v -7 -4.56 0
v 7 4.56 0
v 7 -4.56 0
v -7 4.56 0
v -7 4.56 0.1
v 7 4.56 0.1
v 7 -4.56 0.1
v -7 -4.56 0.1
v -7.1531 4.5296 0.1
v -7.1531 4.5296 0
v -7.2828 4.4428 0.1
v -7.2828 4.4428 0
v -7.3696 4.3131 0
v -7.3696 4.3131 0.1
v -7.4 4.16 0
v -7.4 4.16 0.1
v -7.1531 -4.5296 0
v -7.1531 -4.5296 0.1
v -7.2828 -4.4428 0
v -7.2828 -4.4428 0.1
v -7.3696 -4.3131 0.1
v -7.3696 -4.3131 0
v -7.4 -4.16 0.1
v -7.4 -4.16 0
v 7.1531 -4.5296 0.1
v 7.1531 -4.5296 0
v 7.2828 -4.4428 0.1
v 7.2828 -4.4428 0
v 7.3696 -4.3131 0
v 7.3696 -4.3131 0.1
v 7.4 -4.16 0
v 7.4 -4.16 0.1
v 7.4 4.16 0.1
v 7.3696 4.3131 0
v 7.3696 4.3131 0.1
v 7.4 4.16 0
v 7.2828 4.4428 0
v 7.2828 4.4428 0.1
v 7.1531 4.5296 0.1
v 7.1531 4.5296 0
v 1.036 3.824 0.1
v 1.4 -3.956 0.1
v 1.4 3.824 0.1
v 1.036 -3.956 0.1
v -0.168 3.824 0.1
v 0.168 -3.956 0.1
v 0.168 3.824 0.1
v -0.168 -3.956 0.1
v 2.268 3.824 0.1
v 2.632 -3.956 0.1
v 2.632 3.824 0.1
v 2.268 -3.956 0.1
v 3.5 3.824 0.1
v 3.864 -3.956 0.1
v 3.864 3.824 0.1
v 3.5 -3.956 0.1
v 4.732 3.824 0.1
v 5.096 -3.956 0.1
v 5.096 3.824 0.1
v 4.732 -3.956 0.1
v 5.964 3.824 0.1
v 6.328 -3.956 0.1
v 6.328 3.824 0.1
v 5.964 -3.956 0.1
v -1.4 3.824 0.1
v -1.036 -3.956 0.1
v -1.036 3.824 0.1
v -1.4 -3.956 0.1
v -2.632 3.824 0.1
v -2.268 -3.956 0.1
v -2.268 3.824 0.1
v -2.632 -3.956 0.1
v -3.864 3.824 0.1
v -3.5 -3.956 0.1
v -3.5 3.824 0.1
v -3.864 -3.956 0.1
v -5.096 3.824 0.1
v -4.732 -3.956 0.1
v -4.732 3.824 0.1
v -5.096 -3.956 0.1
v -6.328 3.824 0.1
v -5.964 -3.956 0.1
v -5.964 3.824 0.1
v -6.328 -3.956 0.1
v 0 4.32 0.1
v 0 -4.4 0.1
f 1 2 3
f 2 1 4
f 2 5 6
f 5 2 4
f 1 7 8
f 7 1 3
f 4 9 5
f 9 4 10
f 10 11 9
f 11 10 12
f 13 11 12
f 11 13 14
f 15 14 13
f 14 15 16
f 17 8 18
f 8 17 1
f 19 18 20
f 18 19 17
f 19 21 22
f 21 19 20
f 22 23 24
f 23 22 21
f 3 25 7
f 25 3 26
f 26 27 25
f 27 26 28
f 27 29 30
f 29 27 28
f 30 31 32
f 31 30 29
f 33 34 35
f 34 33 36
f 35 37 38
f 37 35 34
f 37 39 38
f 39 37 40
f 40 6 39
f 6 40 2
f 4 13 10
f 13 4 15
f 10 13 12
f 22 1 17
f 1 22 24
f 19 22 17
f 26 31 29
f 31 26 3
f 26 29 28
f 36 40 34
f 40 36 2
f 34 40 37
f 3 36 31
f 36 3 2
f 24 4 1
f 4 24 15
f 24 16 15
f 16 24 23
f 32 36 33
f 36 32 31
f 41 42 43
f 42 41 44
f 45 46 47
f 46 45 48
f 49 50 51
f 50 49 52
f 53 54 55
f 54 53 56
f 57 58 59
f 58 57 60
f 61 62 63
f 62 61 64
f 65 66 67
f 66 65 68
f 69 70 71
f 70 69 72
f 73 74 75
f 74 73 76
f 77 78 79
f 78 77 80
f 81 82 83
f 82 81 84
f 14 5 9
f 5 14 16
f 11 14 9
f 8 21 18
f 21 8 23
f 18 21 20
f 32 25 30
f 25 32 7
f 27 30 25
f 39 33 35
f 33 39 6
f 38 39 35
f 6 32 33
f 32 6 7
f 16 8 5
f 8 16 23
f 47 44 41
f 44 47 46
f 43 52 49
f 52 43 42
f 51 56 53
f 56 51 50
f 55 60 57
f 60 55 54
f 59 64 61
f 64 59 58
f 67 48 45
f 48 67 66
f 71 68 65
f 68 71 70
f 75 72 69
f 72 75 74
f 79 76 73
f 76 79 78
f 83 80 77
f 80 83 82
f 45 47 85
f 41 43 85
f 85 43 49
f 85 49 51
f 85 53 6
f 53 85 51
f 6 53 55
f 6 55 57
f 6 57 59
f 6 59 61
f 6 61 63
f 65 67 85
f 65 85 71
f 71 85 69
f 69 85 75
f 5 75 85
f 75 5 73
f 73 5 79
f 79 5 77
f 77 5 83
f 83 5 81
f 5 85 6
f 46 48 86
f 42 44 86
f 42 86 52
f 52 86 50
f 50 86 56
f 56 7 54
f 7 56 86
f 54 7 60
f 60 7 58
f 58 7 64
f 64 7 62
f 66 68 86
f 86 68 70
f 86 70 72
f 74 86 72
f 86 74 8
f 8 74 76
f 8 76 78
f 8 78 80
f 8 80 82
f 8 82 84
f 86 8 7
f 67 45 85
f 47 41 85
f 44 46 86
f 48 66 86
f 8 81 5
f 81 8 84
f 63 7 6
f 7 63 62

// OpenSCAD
// file: ../p/box3u12.scad
use <../lib.scad>
function ldraw_lib__box3u12() = [
// 0 Box with 3 Parallel Faces without Any Edges
// 0 Name: box3u12.dat
// 0 Author: J.C. Tchang [tchang]
// 0 !LDRAW_ORG Primitive UPDATE 2014-02
// 0 !LICENSE Licensed under CC BY 2.0 and CC BY 4.0 : see CAreadme.txt
// 
// 0 BFC CERTIFY CCW
  [0,"BFC","CERTIFY"],
  [0,"BFC","CCW"],
// 
// 0 !HISTORY 2014-12-23 [PTadmin] Official Update 2014-02
// 
// 
// 4 16 -1 1 1 1 1 1 1 1 -1 -1 1 -1
  [4,16,-1,1,1,1,1,1,1,1,-1,-1,1,-1],
// 4 16 -1 1 1 -1 0 1 1 0 1 1 1 1
  [4,16,-1,1,1,-1,0,1,1,0,1,1,1,1],
// 4 16 1 1 -1 1 0 -1 -1 0 -1 -1 1 -1
  [4,16,1,1,-1,1,0,-1,-1,0,-1,-1,1,-1],
];
makepoly(ldraw_lib__box3u12(), line=0.2);
// file: ../p/1-4cyli.scad
use <../lib.scad>
function ldraw_lib__1_4cyli() = [
// 0 Cylinder 0.25
// 0 Name: 1-4cyli.dat
// 0 Author: James Jessiman
// 0 !LDRAW_ORG Primitive UPDATE 2012-01
// 0 !LICENSE Licensed under CC BY 2.0 and CC BY 4.0 : see CAreadme.txt
// 
// 0 BFC CERTIFY CCW
  [0,"BFC","CERTIFY"],
  [0,"BFC","CCW"],
// 
// 0 !HISTORY 2002-03-23 [sbliss] Added BFC statement.
// 0 !HISTORY 2002-04-25 [PTadmin] Official Update 2002-02
// 0 !HISTORY 2007-06-22 [PTadmin] Header formatted for Contributor Agreement
// 0 !HISTORY 2008-07-01 [PTadmin] Official Update 2008-01
// 0 !HISTORY 2012-02-16 [Philo] Changed to CCW
// 0 !HISTORY 2012-03-30 [PTadmin] Official Update 2012-01
// 
// 
// 4 16 1 1 0 0.9239 1 0.3827 0.9239 0 0.3827 1 0 0
  [4,16,1,1,0,0.9239,1,0.3827,0.9239,0,0.3827,1,0,0],
// 5 24 1 0 0 1 1 0 0.9239 0 0.3827 1 0 -1
  [5,24,1,0,0,1,1,0,0.9239,0,0.3827,1,0,-1],
// 4 16 0.9239 1 0.3827 0.7071 1 0.7071 0.7071 0 0.7071 0.9239 0 0.3827
  [4,16,0.9239,1,0.3827,0.7071,1,0.7071,0.7071,0,0.7071,0.9239,0,0.3827],
// 5 24 0.9239 0 0.3827 0.9239 1 0.3827 0.7071 0 0.7071 1 0 0
  [5,24,0.9239,0,0.3827,0.9239,1,0.3827,0.7071,0,0.7071,1,0,0],
// 4 16 0.7071 1 0.7071 0.3827 1 0.9239 0.3827 0 0.9239 0.7071 0 0.7071
  [4,16,0.7071,1,0.7071,0.3827,1,0.9239,0.3827,0,0.9239,0.7071,0,0.7071],
// 5 24 0.7071 0 0.7071 0.7071 1 0.7071 0.3827 0 0.9239 0.9239 0 0.3827
  [5,24,0.7071,0,0.7071,0.7071,1,0.7071,0.3827,0,0.9239,0.9239,0,0.3827],
// 4 16 0.3827 1 0.9239 0 1 1 0 0 1 0.3827 0 0.9239
  [4,16,0.3827,1,0.9239,0,1,1,0,0,1,0.3827,0,0.9239],
// 5 24 0.3827 0 0.9239 0.3827 1 0.9239 0 0 1 0.7071 0 0.7071
  [5,24,0.3827,0,0.9239,0.3827,1,0.9239,0,0,1,0.7071,0,0.7071],
// 5 24 0 0 1 0 1 1 0.3827 0 0.9239 -1 0 1
  [5,24,0,0,1,0,1,1,0.3827,0,0.9239,-1,0,1],
];
makepoly(ldraw_lib__1_4cyli(), line=0.2);
// file: ../p/1-4chrd.scad
use <../lib.scad>
function ldraw_lib__1_4chrd() = [
// 0 Chord 0.25
// 0 Name: 1-4chrd.dat
// 0 Author: Tony Hafner [hafhead]
// 0 !LDRAW_ORG Primitive UPDATE 2012-02
// 0 !LICENSE Licensed under CC BY 2.0 and CC BY 4.0 : see CAreadme.txt
// 
// 0 BFC CERTIFY CCW
  [0,"BFC","CERTIFY"],
  [0,"BFC","CCW"],
// 
// 0 !HISTORY 2004-04-22 [PTadmin] Official Update 2004-02
// 0 !HISTORY 2007-10-09 [PTadmin] Header formatted for Contributor Agreement
// 0 !HISTORY 2008-07-01 [PTadmin] Official Update 2008-01
// 0 !HISTORY 2012-08-02 [MMR1988] Re-creation with PrimGen2 and Rectifier
// 0 !HISTORY 2012-08-09 [PTadmin] Official Update 2012-02
// 
// 
// 4 16 0.9239 0 0.3827 0.3827 0 0.9239 0 0 1 1 0 0
  [4,16,0.9239,0,0.3827,0.3827,0,0.9239,0,0,1,1,0,0],
// 3 16 0.7071 0 0.7071 0.3827 0 0.9239 0.9239 0 0.3827
  [3,16,0.7071,0,0.7071,0.3827,0,0.9239,0.9239,0,0.3827],
];
makepoly(ldraw_lib__1_4chrd(), line=0.2);
// main file
use <../lib.scad>
use <../p/1-4chrd.scad>
use <../p/1-4cyli.scad>
use <../p/box3u12.scad>
function ldraw_lib__4121723k() = [
// 0 Sticker  1.1 x  1.9 with 11 Simulated Ventilation Slots on Transparent Background
// 0 Name: 4121723k.dat
// 0 Author: Ulrich Röder [UR]
// 0 !LDRAW_ORG Part UPDATE 2022-06
// 0 !LICENSE Licensed under CC BY 2.0 and CC BY 4.0 : see CAreadme.txt
// 
// 0 BFC CERTIFY CCW
  [0,"BFC","CERTIFY"],
  [0,"BFC","CCW"],
// 
// 0 !KEYWORDS Model Team, Racing Truck, Set 5563
// 
// 0 !HISTORY 2022-12-20 [PTadmin] Official Update 2022-06
// 
// 
// 0 // Body
// 
// 1 16 0 -0.25 0 17.5 0 0 0 0.25 0 0 0 11.4 box3u12.dat
  [1,16,0,-0.25,0,17.5,0,0,0,0.25,0,0,0,11.4, ldraw_lib__box3u12()],
// 1 16 -17.5 0 10.4 0 0 -1 0 -.25 0 1 0 0 1-4cyli.dat
  [1,16,-17.5,0,10.4,0,0,-1,0,-.25,0,1,0,0, ldraw_lib__1_4cyli()],
// 1 16 -17.5 0 -10.4 0 0 -1 0 -.25 0 -1 0 0 1-4cyli.dat
  [1,16,-17.5,0,-10.4,0,0,-1,0,-.25,0,-1,0,0, ldraw_lib__1_4cyli()],
// 1 16 17.5 0 -10.4 0 0 1 0 -.25 0 -1 0 0 1-4cyli.dat
  [1,16,17.5,0,-10.4,0,0,1,0,-.25,0,-1,0,0, ldraw_lib__1_4cyli()],
// 1 16 17.5 0 10.4 1 0 0 0 -.25 0 0 0 1 1-4cyli.dat
  [1,16,17.5,0,10.4,1,0,0,0,-.25,0,0,0,1, ldraw_lib__1_4cyli()],
// 1 16 -17.5 0 10.4 0 0 -1 0 -1 0 1 0 0 1-4chrd.dat
  [1,16,-17.5,0,10.4,0,0,-1,0,-1,0,1,0,0, ldraw_lib__1_4chrd()],
// 1 16 -17.5 0 -10.4 0 0 -1 0 -1 0 -1 0 0 1-4chrd.dat
  [1,16,-17.5,0,-10.4,0,0,-1,0,-1,0,-1,0,0, ldraw_lib__1_4chrd()],
// 1 16 17.5 0 -10.4 0 0 1 0 -1 0 -1 0 0 1-4chrd.dat
  [1,16,17.5,0,-10.4,0,0,1,0,-1,0,-1,0,0, ldraw_lib__1_4chrd()],
// 1 16 17.5 0 10.4 1 0 0 0 -1 0 0 0 1 1-4chrd.dat
  [1,16,17.5,0,10.4,1,0,0,0,-1,0,0,0,1, ldraw_lib__1_4chrd()],
// 4 16 17.5 0 11.4 18.5 0 10.4 18.5 0 -10.4 17.5 0 -11.4
  [4,16,17.5,0,11.4,18.5,0,10.4,18.5,0,-10.4,17.5,0,-11.4],
// 4 16 -17.5 0 -11.4 -18.5 0 -10.4 -18.5 0 10.4 -17.5 0 11.4
  [4,16,-17.5,0,-11.4,-18.5,0,-10.4,-18.5,0,10.4,-17.5,0,11.4],
// 4 16 -18.5 -.25 10.4 -18.5 0 10.4 -18.5 0 -10.4 -18.5 -.25 -10.4
  [4,16,-18.5,-.25,10.4,-18.5,0,10.4,-18.5,0,-10.4,-18.5,-.25,-10.4],
// 4 16 18.5 0 -10.4 18.5 0 10.4 18.5 -.25 10.4 18.5 -.25 -10.4
  [4,16,18.5,0,-10.4,18.5,0,10.4,18.5,-.25,10.4,18.5,-.25,-10.4],
// 
// 0 // Frontface
// 0 BFC NOCLIP
  [0,"BFC","NOCLIP"],
// 4 0 2.59 -.25 9.56 2.59 -.25 -9.89 3.5 -.25 -9.89 3.5 -.25 9.56
  [4,0,2.59,-.25,9.56,2.59,-.25,-9.89,3.5,-.25,-9.89,3.5,-.25,9.56],
// 4 0 .42 -.25 -9.89 .42 -.25 9.56 -.42 -.25 9.56 -.42 -.25 -9.89
  [4,0,.42,-.25,-9.89,.42,-.25,9.56,-.42,-.25,9.56,-.42,-.25,-9.89],
// 4 0 5.67 -.25 9.56 5.67 -.25 -9.89 6.58 -.25 -9.89 6.58 -.25 9.56
  [4,0,5.67,-.25,9.56,5.67,-.25,-9.89,6.58,-.25,-9.89,6.58,-.25,9.56],
// 4 0 8.75 -.25 9.56 8.75 -.25 -9.89 9.66 -.25 -9.89 9.66 -.25 9.56
  [4,0,8.75,-.25,9.56,8.75,-.25,-9.89,9.66,-.25,-9.89,9.66,-.25,9.56],
// 4 0 11.83 -.25 9.56 11.83 -.25 -9.89 12.74 -.25 -9.89 12.74 -.25 9.56
  [4,0,11.83,-.25,9.56,11.83,-.25,-9.89,12.74,-.25,-9.89,12.74,-.25,9.56],
// 4 0 14.91 -.25 9.56 14.91 -.25 -9.89 15.82 -.25 -9.89 15.82 -.25 9.56
  [4,0,14.91,-.25,9.56,14.91,-.25,-9.89,15.82,-.25,-9.89,15.82,-.25,9.56],
// 4 0 -3.5 -.25 -9.89 -2.59 -.25 -9.89 -2.59 -.25 9.56 -3.5 -.25 9.56
  [4,0,-3.5,-.25,-9.89,-2.59,-.25,-9.89,-2.59,-.25,9.56,-3.5,-.25,9.56],
// 4 0 -6.58 -.25 -9.89 -5.67 -.25 -9.89 -5.67 -.25 9.56 -6.58 -.25 9.56
  [4,0,-6.58,-.25,-9.89,-5.67,-.25,-9.89,-5.67,-.25,9.56,-6.58,-.25,9.56],
// 4 0 -9.66 -.25 -9.89 -8.75 -.25 -9.89 -8.75 -.25 9.56 -9.66 -.25 9.56
  [4,0,-9.66,-.25,-9.89,-8.75,-.25,-9.89,-8.75,-.25,9.56,-9.66,-.25,9.56],
// 4 0 -12.74 -.25 -9.89 -11.83 -.25 -9.89 -11.83 -.25 9.56 -12.74 -.25 9.56
  [4,0,-12.74,-.25,-9.89,-11.83,-.25,-9.89,-11.83,-.25,9.56,-12.74,-.25,9.56],
// 4 0 -15.82 -.25 -9.89 -14.91 -.25 -9.89 -14.91 -.25 9.56 -15.82 -.25 9.56
  [4,0,-15.82,-.25,-9.89,-14.91,-.25,-9.89,-14.91,-.25,9.56,-15.82,-.25,9.56],
// 0 BFC CLIP
  [0,"BFC","CLIP"],
// 
// 1 16 -17.5 -.25 10.4 0 0 -1 0 1 0 1 0 0 1-4chrd.dat
  [1,16,-17.5,-.25,10.4,0,0,-1,0,1,0,1,0,0, ldraw_lib__1_4chrd()],
// 1 16 -17.5 -.25 -10.4 0 0 -1 0 1 0 -1 0 0 1-4chrd.dat
  [1,16,-17.5,-.25,-10.4,0,0,-1,0,1,0,-1,0,0, ldraw_lib__1_4chrd()],
// 1 16 17.5 -.25 -10.4 0 0 1 0 1 0 -1 0 0 1-4chrd.dat
  [1,16,17.5,-.25,-10.4,0,0,1,0,1,0,-1,0,0, ldraw_lib__1_4chrd()],
// 1 16 17.5 -.25 10.4 1 0 0 0 1 0 0 0 1 1-4chrd.dat
  [1,16,17.5,-.25,10.4,1,0,0,0,1,0,0,0,1, ldraw_lib__1_4chrd()],
// 4 16 18.5 -.25 -10.4 18.5 -.25 10.4 17.5 -.25 11.4 17.5 -.25 -11.4
  [4,16,18.5,-.25,-10.4,18.5,-.25,10.4,17.5,-.25,11.4,17.5,-.25,-11.4],
// 4 16 -18.5 -.25 10.4 -18.5 -.25 -10.4 -17.5 -.25 -11.4 -17.5 -.25 11.4
  [4,16,-18.5,-.25,10.4,-18.5,-.25,-10.4,-17.5,-.25,-11.4,-17.5,-.25,11.4],
// 4 16 2.59 -.25 -9.89 2.59 -.25 9.56 .42 -.25 9.56 .42 -.25 -9.89
  [4,16,2.59,-.25,-9.89,2.59,-.25,9.56,.42,-.25,9.56,.42,-.25,-9.89],
// 4 16 5.67 -.25 -9.89 5.67 -.25 9.56 3.5 -.25 9.56 3.5 -.25 -9.89
  [4,16,5.67,-.25,-9.89,5.67,-.25,9.56,3.5,-.25,9.56,3.5,-.25,-9.89],
// 4 16 8.75 -.25 -9.89 8.75 -.25 9.56 6.58 -.25 9.56 6.58 -.25 -9.89
  [4,16,8.75,-.25,-9.89,8.75,-.25,9.56,6.58,-.25,9.56,6.58,-.25,-9.89],
// 4 16 11.83 -.25 -9.89 11.83 -.25 9.56 9.66 -.25 9.56 9.66 -.25 -9.89
  [4,16,11.83,-.25,-9.89,11.83,-.25,9.56,9.66,-.25,9.56,9.66,-.25,-9.89],
// 4 16 14.91 -.25 -9.89 14.91 -.25 9.56 12.74 -.25 9.56 12.74 -.25 -9.89
  [4,16,14.91,-.25,-9.89,14.91,-.25,9.56,12.74,-.25,9.56,12.74,-.25,-9.89],
// 4 16 -.42 -.25 9.56 -2.59 -.25 9.56 -2.59 -.25 -9.89 -.42 -.25 -9.89
  [4,16,-.42,-.25,9.56,-2.59,-.25,9.56,-2.59,-.25,-9.89,-.42,-.25,-9.89],
// 4 16 -3.5 -.25 9.56 -5.67 -.25 9.56 -5.67 -.25 -9.89 -3.5 -.25 -9.89
  [4,16,-3.5,-.25,9.56,-5.67,-.25,9.56,-5.67,-.25,-9.89,-3.5,-.25,-9.89],
// 4 16 -6.58 -.25 9.56 -8.75 -.25 9.56 -8.75 -.25 -9.89 -6.58 -.25 -9.89
  [4,16,-6.58,-.25,9.56,-8.75,-.25,9.56,-8.75,-.25,-9.89,-6.58,-.25,-9.89],
// 4 16 -9.66 -.25 9.56 -11.83 -.25 9.56 -11.83 -.25 -9.89 -9.66 -.25 -9.89
  [4,16,-9.66,-.25,9.56,-11.83,-.25,9.56,-11.83,-.25,-9.89,-9.66,-.25,-9.89],
// 4 16 -12.74 -.25 9.56 -14.91 -.25 9.56 -14.91 -.25 -9.89 -12.74 -.25 -9.89
  [4,16,-12.74,-.25,9.56,-14.91,-.25,9.56,-14.91,-.25,-9.89,-12.74,-.25,-9.89],
// 3 16 -.42 -.25 9.56 .42 -.25 9.56 0 -.25 10.8
  [3,16,-.42,-.25,9.56,.42,-.25,9.56,0,-.25,10.8],
// 3 16 2.59 -.25 9.56 3.5 -.25 9.56 0 -.25 10.8
  [3,16,2.59,-.25,9.56,3.5,-.25,9.56,0,-.25,10.8],
// 3 16 0 -.25 10.8 3.5 -.25 9.56 5.67 -.25 9.56
  [3,16,0,-.25,10.8,3.5,-.25,9.56,5.67,-.25,9.56],
// 3 16 0 -.25 10.8 5.67 -.25 9.56 6.58 -.25 9.56
  [3,16,0,-.25,10.8,5.67,-.25,9.56,6.58,-.25,9.56],
// 4 16 17.5 -.25 11.4 0 -.25 10.8 6.58 -.25 9.56 8.75 -.25 9.56
  [4,16,17.5,-.25,11.4,0,-.25,10.8,6.58,-.25,9.56,8.75,-.25,9.56],
// 3 16 17.5 -.25 11.4 8.75 -.25 9.56 9.66 -.25 9.56
  [3,16,17.5,-.25,11.4,8.75,-.25,9.56,9.66,-.25,9.56],
// 3 16 17.5 -.25 11.4 9.66 -.25 9.56 11.83 -.25 9.56
  [3,16,17.5,-.25,11.4,9.66,-.25,9.56,11.83,-.25,9.56],
// 3 16 17.5 -.25 11.4 11.83 -.25 9.56 12.74 -.25 9.56
  [3,16,17.5,-.25,11.4,11.83,-.25,9.56,12.74,-.25,9.56],
// 3 16 17.5 -.25 11.4 12.74 -.25 9.56 14.91 -.25 9.56
  [3,16,17.5,-.25,11.4,12.74,-.25,9.56,14.91,-.25,9.56],
// 3 16 17.5 -.25 11.4 14.91 -.25 9.56 15.82 -.25 9.56
  [3,16,17.5,-.25,11.4,14.91,-.25,9.56,15.82,-.25,9.56],
// 3 16 -3.5 -.25 9.56 -2.59 -.25 9.56 0 -.25 10.8
  [3,16,-3.5,-.25,9.56,-2.59,-.25,9.56,0,-.25,10.8],
// 3 16 -3.5 -.25 9.56 0 -.25 10.8 -5.67 -.25 9.56
  [3,16,-3.5,-.25,9.56,0,-.25,10.8,-5.67,-.25,9.56],
// 3 16 -5.67 -.25 9.56 0 -.25 10.8 -6.58 -.25 9.56
  [3,16,-5.67,-.25,9.56,0,-.25,10.8,-6.58,-.25,9.56],
// 3 16 -6.58 -.25 9.56 0 -.25 10.8 -8.75 -.25 9.56
  [3,16,-6.58,-.25,9.56,0,-.25,10.8,-8.75,-.25,9.56],
// 4 16 0 -.25 10.8 -17.5 -.25 11.4 -9.66 -.25 9.56 -8.75 -.25 9.56
  [4,16,0,-.25,10.8,-17.5,-.25,11.4,-9.66,-.25,9.56,-8.75,-.25,9.56],
// 3 16 -9.66 -.25 9.56 -17.5 -.25 11.4 -11.83 -.25 9.56
  [3,16,-9.66,-.25,9.56,-17.5,-.25,11.4,-11.83,-.25,9.56],
// 3 16 -11.83 -.25 9.56 -17.5 -.25 11.4 -12.74 -.25 9.56
  [3,16,-11.83,-.25,9.56,-17.5,-.25,11.4,-12.74,-.25,9.56],
// 3 16 -12.74 -.25 9.56 -17.5 -.25 11.4 -14.91 -.25 9.56
  [3,16,-12.74,-.25,9.56,-17.5,-.25,11.4,-14.91,-.25,9.56],
// 3 16 -14.91 -.25 9.56 -17.5 -.25 11.4 -15.82 -.25 9.56
  [3,16,-14.91,-.25,9.56,-17.5,-.25,11.4,-15.82,-.25,9.56],
// 3 16 -17.5 -.25 11.4 0 -.25 10.8 17.5 -.25 11.4
  [3,16,-17.5,-.25,11.4,0,-.25,10.8,17.5,-.25,11.4],
// 3 16 .42 -.25 -9.89 -.42 -.25 -9.89 0 -.25 -11
  [3,16,.42,-.25,-9.89,-.42,-.25,-9.89,0,-.25,-11],
// 3 16 3.5 -.25 -9.89 2.59 -.25 -9.89 0 -.25 -11
  [3,16,3.5,-.25,-9.89,2.59,-.25,-9.89,0,-.25,-11],
// 3 16 3.5 -.25 -9.89 0 -.25 -11 5.67 -.25 -9.89
  [3,16,3.5,-.25,-9.89,0,-.25,-11,5.67,-.25,-9.89],
// 3 16 5.67 -.25 -9.89 0 -.25 -11 6.58 -.25 -9.89
  [3,16,5.67,-.25,-9.89,0,-.25,-11,6.58,-.25,-9.89],
// 3 16 6.58 -.25 -9.89 0 -.25 -11 8.75 -.25 -9.89
  [3,16,6.58,-.25,-9.89,0,-.25,-11,8.75,-.25,-9.89],
// 4 16 0 -.25 -11 17.5 -.25 -11.4 9.66 -.25 -9.89 8.75 -.25 -9.89
  [4,16,0,-.25,-11,17.5,-.25,-11.4,9.66,-.25,-9.89,8.75,-.25,-9.89],
// 3 16 9.66 -.25 -9.89 17.5 -.25 -11.4 11.83 -.25 -9.89
  [3,16,9.66,-.25,-9.89,17.5,-.25,-11.4,11.83,-.25,-9.89],
// 3 16 11.83 -.25 -9.89 17.5 -.25 -11.4 12.74 -.25 -9.89
  [3,16,11.83,-.25,-9.89,17.5,-.25,-11.4,12.74,-.25,-9.89],
// 3 16 12.74 -.25 -9.89 17.5 -.25 -11.4 14.91 -.25 -9.89
  [3,16,12.74,-.25,-9.89,17.5,-.25,-11.4,14.91,-.25,-9.89],
// 3 16 14.91 -.25 -9.89 17.5 -.25 -11.4 15.82 -.25 -9.89
  [3,16,14.91,-.25,-9.89,17.5,-.25,-11.4,15.82,-.25,-9.89],
// 3 16 -2.59 -.25 -9.89 -3.5 -.25 -9.89 0 -.25 -11
  [3,16,-2.59,-.25,-9.89,-3.5,-.25,-9.89,0,-.25,-11],
// 3 16 0 -.25 -11 -3.5 -.25 -9.89 -5.67 -.25 -9.89
  [3,16,0,-.25,-11,-3.5,-.25,-9.89,-5.67,-.25,-9.89],
// 3 16 0 -.25 -11 -5.67 -.25 -9.89 -6.58 -.25 -9.89
  [3,16,0,-.25,-11,-5.67,-.25,-9.89,-6.58,-.25,-9.89],
// 4 16 -17.5 -.25 -11.4 0 -.25 -11 -6.58 -.25 -9.89 -8.75 -.25 -9.89
  [4,16,-17.5,-.25,-11.4,0,-.25,-11,-6.58,-.25,-9.89,-8.75,-.25,-9.89],
// 3 16 -17.5 -.25 -11.4 -8.75 -.25 -9.89 -9.66 -.25 -9.89
  [3,16,-17.5,-.25,-11.4,-8.75,-.25,-9.89,-9.66,-.25,-9.89],
// 3 16 -17.5 -.25 -11.4 -9.66 -.25 -9.89 -11.83 -.25 -9.89
  [3,16,-17.5,-.25,-11.4,-9.66,-.25,-9.89,-11.83,-.25,-9.89],
// 3 16 -17.5 -.25 -11.4 -11.83 -.25 -9.89 -12.74 -.25 -9.89
  [3,16,-17.5,-.25,-11.4,-11.83,-.25,-9.89,-12.74,-.25,-9.89],
// 3 16 -17.5 -.25 -11.4 -12.74 -.25 -9.89 -14.91 -.25 -9.89
  [3,16,-17.5,-.25,-11.4,-12.74,-.25,-9.89,-14.91,-.25,-9.89],
// 3 16 -17.5 -.25 -11.4 -14.91 -.25 -9.89 -15.82 -.25 -9.89
  [3,16,-17.5,-.25,-11.4,-14.91,-.25,-9.89,-15.82,-.25,-9.89],
// 3 16 0 -.25 -11 -17.5 -.25 -11.4 17.5 -.25 -11.4
  [3,16,0,-.25,-11,-17.5,-.25,-11.4,17.5,-.25,-11.4],
// 3 16 -2.59 -.25 9.56 -.42 -.25 9.56 0 -.25 10.8
  [3,16,-2.59,-.25,9.56,-.42,-.25,9.56,0,-.25,10.8],
// 3 16 .42 -.25 9.56 2.59 -.25 9.56 0 -.25 10.8
  [3,16,.42,-.25,9.56,2.59,-.25,9.56,0,-.25,10.8],
// 3 16 2.59 -.25 -9.89 .42 -.25 -9.89 0 -.25 -11
  [3,16,2.59,-.25,-9.89,.42,-.25,-9.89,0,-.25,-11],
// 3 16 -.42 -.25 -9.89 -2.59 -.25 -9.89 0 -.25 -11
  [3,16,-.42,-.25,-9.89,-2.59,-.25,-9.89,0,-.25,-11],
// 4 16 -17.5 -.25 -11.4 -15.82 -.25 -9.89 -15.82 -.25 9.56 -17.5 -.25 11.4
  [4,16,-17.5,-.25,-11.4,-15.82,-.25,-9.89,-15.82,-.25,9.56,-17.5,-.25,11.4],
// 4 16 15.82 -.25 9.56 15.82 -.25 -9.89 17.5 -.25 -11.4 17.5 -.25 11.4
  [4,16,15.82,-.25,9.56,15.82,-.25,-9.89,17.5,-.25,-11.4,17.5,-.25,11.4],
];
makepoly(ldraw_lib__4121723k(), line=0.2);
